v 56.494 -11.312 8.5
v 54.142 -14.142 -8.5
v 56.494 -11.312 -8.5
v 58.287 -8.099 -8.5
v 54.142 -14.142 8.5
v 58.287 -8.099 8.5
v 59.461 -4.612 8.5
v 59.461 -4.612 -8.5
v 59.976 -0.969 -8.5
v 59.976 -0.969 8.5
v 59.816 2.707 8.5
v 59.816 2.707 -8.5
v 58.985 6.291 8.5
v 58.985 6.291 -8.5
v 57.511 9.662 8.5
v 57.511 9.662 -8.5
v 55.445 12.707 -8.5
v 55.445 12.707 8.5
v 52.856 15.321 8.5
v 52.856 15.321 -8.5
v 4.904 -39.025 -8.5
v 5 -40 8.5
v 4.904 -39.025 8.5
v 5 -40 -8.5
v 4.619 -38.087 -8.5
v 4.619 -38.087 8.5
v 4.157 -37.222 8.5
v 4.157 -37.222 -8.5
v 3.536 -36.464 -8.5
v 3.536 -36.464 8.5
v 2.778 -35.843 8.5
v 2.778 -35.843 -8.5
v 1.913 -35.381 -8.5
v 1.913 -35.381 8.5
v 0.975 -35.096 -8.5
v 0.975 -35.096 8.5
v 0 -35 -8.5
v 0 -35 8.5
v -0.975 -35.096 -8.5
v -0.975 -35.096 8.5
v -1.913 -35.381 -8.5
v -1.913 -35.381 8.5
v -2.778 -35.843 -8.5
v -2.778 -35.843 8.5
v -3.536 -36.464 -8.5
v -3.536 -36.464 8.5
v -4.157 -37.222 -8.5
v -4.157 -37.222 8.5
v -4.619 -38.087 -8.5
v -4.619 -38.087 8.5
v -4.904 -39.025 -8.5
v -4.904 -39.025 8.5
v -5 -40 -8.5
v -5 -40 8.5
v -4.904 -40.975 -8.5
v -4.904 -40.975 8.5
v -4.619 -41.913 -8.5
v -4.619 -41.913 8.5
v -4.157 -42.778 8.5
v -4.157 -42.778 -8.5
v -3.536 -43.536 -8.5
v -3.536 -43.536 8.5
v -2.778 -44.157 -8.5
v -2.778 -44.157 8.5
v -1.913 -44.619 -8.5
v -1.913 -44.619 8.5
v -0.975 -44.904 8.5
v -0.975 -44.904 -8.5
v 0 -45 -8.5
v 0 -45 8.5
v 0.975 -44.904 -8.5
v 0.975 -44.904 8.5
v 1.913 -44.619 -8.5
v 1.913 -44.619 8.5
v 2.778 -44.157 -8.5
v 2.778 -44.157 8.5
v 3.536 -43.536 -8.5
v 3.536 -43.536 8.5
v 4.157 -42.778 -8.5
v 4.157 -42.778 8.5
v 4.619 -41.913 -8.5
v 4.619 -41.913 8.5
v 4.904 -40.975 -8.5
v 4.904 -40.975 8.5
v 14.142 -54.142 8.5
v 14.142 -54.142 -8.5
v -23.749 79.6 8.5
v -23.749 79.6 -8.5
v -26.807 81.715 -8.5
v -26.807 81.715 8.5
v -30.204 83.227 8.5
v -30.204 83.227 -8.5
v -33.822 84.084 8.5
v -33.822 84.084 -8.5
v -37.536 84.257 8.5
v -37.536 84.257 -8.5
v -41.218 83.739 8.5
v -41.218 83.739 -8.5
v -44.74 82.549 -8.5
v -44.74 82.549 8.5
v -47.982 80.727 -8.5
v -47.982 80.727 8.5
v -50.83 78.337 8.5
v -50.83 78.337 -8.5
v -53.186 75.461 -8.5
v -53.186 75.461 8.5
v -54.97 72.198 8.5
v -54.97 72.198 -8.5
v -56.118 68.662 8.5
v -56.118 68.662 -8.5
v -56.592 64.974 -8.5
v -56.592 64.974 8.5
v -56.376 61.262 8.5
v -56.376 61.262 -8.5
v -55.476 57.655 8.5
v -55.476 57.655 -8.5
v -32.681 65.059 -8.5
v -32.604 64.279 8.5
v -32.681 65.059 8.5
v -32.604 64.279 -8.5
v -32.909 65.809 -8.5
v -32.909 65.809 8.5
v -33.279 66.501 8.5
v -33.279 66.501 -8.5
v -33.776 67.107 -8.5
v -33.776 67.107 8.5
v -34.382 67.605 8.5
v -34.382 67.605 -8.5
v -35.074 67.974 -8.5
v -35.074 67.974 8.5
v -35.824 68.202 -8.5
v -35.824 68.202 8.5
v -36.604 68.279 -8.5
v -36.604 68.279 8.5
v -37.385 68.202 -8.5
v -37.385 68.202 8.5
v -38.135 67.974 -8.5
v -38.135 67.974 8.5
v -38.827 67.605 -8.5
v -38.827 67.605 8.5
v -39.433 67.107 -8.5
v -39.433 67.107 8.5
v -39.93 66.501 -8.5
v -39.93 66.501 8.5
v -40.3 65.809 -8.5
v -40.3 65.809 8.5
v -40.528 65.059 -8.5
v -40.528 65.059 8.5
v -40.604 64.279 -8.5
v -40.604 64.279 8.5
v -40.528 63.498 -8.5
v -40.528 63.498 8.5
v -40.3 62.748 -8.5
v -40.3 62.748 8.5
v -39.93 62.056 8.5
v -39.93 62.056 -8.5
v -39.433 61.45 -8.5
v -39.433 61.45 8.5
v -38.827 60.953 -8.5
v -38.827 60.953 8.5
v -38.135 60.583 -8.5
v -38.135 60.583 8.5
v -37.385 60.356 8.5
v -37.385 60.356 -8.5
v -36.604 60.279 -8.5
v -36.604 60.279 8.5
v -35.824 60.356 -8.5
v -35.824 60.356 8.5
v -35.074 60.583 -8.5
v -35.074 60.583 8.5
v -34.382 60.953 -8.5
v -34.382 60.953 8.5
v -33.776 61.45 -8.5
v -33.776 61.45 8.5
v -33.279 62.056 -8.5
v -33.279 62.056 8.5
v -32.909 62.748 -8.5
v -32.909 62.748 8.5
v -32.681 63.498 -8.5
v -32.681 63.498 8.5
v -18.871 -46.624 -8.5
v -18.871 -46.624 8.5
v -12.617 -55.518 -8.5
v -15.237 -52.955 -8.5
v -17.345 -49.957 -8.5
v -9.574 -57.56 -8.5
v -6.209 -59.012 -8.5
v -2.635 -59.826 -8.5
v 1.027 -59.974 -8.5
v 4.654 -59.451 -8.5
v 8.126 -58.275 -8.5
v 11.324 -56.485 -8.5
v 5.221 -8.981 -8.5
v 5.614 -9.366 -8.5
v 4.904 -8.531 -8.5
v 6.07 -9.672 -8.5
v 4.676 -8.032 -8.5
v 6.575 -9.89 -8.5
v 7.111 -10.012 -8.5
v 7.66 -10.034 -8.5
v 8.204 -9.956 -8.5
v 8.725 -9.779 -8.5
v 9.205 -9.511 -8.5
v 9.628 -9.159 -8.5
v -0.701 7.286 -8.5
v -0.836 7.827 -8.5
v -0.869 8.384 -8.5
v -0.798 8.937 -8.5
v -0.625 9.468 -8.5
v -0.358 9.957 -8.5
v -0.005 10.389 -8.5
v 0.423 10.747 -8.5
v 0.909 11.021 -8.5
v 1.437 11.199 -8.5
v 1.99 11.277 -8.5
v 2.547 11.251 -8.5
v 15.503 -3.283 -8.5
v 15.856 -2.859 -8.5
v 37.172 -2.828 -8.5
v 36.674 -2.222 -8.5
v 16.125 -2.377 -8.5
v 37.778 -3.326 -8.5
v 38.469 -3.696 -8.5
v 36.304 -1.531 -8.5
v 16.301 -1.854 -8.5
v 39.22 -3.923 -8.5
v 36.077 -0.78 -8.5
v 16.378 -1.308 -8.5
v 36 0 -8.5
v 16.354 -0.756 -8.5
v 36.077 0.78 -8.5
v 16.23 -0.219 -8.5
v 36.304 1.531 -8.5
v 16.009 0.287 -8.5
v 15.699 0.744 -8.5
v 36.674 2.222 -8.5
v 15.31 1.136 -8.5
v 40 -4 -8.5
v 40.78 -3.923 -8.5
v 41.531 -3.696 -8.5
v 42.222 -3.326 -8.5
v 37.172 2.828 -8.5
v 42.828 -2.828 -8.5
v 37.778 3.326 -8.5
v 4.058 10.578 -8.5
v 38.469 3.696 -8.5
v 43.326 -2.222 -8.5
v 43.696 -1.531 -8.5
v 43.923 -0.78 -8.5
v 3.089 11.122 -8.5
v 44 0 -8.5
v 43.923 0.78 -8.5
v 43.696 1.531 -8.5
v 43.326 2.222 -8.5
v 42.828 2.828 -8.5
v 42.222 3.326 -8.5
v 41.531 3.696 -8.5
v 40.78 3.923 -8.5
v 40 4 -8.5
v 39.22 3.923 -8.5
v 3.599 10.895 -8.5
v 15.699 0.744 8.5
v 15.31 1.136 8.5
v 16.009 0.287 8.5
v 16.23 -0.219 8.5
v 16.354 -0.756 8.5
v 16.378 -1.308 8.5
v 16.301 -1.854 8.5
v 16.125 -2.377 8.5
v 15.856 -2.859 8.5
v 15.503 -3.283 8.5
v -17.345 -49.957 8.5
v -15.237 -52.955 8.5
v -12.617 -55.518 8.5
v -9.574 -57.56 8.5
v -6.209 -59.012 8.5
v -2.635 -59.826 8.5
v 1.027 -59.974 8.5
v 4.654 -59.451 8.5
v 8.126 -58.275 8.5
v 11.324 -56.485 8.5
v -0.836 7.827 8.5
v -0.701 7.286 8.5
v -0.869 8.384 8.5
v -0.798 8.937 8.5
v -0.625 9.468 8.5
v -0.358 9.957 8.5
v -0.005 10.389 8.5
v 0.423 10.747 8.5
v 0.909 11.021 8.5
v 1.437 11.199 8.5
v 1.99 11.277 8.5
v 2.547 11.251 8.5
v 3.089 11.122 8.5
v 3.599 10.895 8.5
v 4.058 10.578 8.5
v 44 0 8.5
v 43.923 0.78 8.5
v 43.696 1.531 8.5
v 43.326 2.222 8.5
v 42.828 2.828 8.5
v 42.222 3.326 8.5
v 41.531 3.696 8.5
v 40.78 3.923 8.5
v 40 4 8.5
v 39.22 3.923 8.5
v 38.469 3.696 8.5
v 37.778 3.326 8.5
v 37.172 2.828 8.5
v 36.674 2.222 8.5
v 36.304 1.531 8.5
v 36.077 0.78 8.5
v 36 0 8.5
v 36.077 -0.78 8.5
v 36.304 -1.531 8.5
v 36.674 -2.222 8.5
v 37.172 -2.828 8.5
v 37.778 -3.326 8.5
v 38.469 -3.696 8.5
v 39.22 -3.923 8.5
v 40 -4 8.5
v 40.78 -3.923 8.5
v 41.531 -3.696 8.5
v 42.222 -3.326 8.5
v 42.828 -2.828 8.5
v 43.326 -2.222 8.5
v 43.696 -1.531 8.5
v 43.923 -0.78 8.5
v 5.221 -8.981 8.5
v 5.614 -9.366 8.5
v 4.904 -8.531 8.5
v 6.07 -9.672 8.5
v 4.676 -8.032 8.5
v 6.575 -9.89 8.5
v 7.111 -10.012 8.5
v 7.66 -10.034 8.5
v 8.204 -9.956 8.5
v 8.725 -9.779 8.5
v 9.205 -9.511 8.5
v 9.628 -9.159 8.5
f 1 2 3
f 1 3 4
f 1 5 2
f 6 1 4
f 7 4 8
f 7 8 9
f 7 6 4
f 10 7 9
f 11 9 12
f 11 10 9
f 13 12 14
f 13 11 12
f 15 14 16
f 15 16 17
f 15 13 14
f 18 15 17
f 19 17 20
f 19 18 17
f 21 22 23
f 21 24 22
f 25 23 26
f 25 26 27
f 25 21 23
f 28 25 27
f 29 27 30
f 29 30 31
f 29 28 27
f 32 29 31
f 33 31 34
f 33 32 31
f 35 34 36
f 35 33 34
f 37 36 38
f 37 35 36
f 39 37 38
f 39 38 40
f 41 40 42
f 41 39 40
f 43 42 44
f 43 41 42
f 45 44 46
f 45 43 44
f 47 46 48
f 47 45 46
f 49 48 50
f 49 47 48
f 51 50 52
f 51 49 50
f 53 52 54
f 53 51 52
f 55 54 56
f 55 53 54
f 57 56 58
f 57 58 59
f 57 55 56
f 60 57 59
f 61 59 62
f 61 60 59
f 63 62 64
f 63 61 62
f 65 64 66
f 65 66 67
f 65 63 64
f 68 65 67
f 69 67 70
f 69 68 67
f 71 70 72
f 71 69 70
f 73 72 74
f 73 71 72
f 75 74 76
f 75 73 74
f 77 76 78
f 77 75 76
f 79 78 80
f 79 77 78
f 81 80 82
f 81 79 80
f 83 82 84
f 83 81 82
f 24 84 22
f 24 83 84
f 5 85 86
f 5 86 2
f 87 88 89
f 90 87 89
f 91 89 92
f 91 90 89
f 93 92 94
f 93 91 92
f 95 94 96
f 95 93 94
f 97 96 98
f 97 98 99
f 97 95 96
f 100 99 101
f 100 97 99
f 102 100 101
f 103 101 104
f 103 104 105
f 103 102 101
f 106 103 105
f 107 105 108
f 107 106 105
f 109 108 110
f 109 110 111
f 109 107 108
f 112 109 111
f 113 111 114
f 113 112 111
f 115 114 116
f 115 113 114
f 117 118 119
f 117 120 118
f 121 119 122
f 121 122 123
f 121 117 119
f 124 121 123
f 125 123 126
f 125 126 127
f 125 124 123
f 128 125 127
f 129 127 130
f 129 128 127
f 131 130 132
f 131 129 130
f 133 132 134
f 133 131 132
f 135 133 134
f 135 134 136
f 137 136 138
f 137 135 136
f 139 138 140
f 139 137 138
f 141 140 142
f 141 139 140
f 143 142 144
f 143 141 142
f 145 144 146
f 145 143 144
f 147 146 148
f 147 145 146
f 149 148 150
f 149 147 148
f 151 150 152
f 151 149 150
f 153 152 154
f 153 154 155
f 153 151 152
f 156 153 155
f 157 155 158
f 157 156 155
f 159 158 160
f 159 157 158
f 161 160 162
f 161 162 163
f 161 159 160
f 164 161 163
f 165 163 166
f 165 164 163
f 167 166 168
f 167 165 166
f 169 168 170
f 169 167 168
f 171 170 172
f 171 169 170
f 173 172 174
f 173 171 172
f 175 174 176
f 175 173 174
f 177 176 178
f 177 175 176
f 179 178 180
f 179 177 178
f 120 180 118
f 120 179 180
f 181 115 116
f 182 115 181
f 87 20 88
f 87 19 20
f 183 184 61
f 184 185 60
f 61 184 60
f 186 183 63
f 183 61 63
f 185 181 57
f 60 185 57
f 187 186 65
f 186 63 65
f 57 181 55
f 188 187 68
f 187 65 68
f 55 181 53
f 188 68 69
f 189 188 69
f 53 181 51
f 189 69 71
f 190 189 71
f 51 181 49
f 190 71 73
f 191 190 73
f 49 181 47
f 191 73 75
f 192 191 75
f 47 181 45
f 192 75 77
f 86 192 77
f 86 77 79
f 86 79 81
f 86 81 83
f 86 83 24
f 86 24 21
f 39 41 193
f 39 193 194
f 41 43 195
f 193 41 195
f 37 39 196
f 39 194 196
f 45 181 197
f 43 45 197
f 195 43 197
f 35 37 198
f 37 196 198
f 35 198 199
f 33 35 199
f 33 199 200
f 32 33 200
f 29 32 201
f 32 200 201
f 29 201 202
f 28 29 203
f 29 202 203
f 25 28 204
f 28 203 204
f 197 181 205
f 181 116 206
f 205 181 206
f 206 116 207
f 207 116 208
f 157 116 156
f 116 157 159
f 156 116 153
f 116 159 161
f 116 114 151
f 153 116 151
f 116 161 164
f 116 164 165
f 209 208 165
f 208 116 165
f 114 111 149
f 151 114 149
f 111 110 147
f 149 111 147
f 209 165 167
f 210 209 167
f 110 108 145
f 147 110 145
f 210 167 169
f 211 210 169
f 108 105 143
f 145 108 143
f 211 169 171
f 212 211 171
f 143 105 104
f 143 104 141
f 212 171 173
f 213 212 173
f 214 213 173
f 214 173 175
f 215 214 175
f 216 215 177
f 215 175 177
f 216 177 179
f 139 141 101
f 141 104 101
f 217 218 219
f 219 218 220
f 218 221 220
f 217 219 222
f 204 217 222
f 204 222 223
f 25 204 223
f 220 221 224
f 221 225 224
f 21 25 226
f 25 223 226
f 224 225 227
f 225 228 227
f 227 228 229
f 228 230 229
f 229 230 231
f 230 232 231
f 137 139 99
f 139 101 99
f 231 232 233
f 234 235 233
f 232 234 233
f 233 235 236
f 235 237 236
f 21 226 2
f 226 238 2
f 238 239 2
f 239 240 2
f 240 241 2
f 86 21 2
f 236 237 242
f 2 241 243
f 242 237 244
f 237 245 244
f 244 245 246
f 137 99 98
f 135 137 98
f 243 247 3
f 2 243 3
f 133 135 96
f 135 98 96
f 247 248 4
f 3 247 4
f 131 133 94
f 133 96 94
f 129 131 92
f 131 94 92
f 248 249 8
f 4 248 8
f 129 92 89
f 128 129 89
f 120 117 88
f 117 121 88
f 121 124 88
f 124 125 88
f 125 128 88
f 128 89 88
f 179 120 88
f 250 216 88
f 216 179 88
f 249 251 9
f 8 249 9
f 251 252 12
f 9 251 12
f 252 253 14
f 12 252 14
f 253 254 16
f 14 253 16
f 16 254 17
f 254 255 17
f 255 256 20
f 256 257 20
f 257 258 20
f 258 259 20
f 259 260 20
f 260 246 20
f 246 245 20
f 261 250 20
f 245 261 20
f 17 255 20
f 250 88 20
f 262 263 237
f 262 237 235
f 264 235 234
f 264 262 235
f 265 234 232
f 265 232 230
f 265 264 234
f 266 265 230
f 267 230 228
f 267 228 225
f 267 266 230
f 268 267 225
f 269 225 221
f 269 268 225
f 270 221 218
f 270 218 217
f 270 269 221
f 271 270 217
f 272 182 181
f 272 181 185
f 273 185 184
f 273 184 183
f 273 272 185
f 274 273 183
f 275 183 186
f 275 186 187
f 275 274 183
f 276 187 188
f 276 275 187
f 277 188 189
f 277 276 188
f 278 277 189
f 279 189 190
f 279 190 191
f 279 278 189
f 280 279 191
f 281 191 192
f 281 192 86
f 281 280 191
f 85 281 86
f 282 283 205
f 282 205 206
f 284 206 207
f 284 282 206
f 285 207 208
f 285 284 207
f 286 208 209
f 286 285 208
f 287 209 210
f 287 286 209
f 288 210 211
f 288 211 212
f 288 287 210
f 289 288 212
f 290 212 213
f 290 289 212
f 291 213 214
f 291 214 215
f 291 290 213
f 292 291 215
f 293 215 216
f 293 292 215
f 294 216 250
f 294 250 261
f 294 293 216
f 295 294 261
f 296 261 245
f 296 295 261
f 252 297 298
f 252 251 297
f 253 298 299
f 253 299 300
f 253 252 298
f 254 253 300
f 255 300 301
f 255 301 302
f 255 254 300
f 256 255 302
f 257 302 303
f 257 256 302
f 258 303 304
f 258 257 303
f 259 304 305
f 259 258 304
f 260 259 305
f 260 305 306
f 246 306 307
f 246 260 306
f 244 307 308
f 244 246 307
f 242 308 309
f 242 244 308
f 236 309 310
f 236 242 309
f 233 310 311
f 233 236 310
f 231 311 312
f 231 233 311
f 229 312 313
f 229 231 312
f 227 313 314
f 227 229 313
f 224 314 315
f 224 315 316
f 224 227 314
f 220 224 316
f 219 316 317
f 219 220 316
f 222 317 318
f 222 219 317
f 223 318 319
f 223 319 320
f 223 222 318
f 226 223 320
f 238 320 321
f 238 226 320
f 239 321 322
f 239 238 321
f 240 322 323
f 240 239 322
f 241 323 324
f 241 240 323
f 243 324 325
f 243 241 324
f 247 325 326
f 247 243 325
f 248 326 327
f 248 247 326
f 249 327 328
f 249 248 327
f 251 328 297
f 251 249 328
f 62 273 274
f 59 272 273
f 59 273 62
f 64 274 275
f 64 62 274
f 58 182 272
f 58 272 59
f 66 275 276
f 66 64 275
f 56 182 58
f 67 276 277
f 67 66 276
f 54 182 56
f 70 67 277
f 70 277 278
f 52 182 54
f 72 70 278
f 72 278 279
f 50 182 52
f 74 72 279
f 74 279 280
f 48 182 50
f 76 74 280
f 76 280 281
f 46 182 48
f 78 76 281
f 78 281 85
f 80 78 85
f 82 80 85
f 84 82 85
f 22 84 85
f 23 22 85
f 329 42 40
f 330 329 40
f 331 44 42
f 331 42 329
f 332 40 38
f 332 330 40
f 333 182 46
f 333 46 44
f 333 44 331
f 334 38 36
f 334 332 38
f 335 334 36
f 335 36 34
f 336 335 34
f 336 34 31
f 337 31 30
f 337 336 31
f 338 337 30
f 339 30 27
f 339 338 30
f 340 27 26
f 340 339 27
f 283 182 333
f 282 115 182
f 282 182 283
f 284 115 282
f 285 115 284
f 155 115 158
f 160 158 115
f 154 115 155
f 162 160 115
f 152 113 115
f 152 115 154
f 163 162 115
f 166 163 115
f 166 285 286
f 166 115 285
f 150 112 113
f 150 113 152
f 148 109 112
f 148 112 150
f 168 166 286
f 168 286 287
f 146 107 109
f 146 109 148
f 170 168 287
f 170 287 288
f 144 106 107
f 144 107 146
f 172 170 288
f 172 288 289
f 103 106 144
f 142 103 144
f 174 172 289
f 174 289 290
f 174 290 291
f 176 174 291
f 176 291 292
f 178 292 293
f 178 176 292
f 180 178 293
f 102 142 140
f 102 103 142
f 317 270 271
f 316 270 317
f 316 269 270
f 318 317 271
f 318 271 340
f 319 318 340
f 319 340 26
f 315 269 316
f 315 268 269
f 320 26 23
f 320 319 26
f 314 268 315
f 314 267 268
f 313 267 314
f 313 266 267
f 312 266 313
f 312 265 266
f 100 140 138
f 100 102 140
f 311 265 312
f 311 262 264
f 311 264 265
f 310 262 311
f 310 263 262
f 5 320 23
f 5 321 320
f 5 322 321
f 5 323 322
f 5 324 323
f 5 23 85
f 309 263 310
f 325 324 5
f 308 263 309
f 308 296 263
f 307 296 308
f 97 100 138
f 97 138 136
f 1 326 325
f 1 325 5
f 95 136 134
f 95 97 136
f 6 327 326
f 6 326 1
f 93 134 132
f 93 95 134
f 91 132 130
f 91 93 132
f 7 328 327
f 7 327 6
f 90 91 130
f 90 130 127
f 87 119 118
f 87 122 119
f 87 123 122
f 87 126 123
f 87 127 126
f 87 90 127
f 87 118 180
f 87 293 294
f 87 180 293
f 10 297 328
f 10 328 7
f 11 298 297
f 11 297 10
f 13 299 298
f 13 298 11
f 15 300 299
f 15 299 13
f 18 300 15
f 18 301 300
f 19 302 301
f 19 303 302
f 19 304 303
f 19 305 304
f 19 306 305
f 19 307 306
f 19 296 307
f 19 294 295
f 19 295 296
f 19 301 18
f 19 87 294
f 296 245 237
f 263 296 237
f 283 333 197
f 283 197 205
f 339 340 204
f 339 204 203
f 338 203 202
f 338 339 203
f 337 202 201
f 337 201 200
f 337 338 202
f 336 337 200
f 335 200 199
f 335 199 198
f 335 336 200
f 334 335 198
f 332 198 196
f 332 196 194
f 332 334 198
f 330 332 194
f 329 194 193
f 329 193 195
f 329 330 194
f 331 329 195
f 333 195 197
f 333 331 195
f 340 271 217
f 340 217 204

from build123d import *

# Parameters (mm, degrees)
F0_R     = 5
F0_R_2   = 4
F1_DEPTH = 8.5


with BuildPart() as f1:
    # F0 (on Top) → F1 (new body, symmetric)
    with BuildSketch(Plane.XY):
        with BuildLine():
            ThreePointArc((-23.748692, 79.59965), (-47.98176, 80.727368), (-55.475573, 57.654524))
            Line((-55.475573, 57.654524), (-18.871129, -46.624236))
            ThreePointArc((-18.871129, -46.624236), (-4.440782, -59.500755), (14.142136, -54.142136))
            Line((14.142136, -54.142136), (54.142136, -14.142136))
            ThreePointArc((54.142136, -14.142136), (59.980964, 0.872388), (52.855752, 15.320889))
            Line((52.855752, 15.320889), (-23.748692, 79.59965))
        make_face()
        with Locations((0, -40)):
            Circle(F0_R, mode=Mode.SUBTRACT)
        with BuildLine():
            Line((4.057651, 10.578103), (15.310351, 1.135966))
            ThreePointArc((15.310351, 1.135966), (16.379133, -1.031309), (15.503309, -3.283488))
            Line((15.503309, -3.283488), (9.627566, -9.159231))
            ThreePointArc((9.627566, -9.159231), (6.840128, -9.963024), (4.675576, -8.031546))
            Line((4.675576, -8.031546), (-0.701381, 7.286334))
            ThreePointArc((-0.701381, 7.286334), (0.422691, 10.74726), (4.057651, 10.578103))
        make_face(mode=Mode.SUBTRACT)
        with Locations((40, 0)):
            Circle(F0_R_2, mode=Mode.SUBTRACT)
        with Locations((-36.604444, 64.278761)):
            Circle(F0_R_2, mode=Mode.SUBTRACT)
    extrude(amount=F1_DEPTH, both=True)


solid = f1.part
